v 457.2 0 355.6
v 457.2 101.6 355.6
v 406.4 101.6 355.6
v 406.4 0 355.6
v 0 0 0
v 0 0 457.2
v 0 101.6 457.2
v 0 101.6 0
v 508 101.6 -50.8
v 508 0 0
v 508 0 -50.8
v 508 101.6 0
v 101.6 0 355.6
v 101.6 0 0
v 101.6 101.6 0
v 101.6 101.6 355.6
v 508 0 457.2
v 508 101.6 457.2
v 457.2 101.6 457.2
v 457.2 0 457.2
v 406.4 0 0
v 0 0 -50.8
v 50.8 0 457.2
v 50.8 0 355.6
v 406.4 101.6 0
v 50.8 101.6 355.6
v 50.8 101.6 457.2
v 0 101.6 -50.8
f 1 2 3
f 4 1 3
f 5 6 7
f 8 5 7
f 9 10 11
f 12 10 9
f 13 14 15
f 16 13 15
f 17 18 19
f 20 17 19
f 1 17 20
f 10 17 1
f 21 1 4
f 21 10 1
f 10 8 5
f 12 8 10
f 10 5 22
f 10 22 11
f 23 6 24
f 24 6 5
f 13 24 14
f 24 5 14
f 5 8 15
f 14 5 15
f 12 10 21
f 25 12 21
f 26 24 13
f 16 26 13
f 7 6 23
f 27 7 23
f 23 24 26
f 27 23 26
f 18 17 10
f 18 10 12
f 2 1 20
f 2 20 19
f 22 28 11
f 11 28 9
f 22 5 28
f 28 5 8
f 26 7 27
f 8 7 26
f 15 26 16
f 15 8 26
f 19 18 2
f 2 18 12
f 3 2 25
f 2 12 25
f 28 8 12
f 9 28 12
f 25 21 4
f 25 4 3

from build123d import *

# Parameters (mm, degrees)
F0_W     = 50.8
F0_H     = 101.6
F1_DEPTH = 457.2
F2_W     = 50.8
F2_H     = 101.6
F3_DEPTH = 355.6
F6_W     = 508
F6_H     = 101.6
F7_DEPTH = 50.8


with BuildPart() as f1:
    # F0 (on Top) → F1 (new body)
    with BuildSketch(Plane.XY):
        with Locations((25.4, 50.8)):
            Rectangle(F0_W, F0_H)
    extrude(amount=F1_DEPTH)

    # F2 (on Top) → F3 (join)
    with BuildSketch(Plane.XY):
        with Locations((76.2, 50.8)):
            Rectangle(F2_W, F2_H)
    extrude(amount=F3_DEPTH)


with BuildPart() as f5_1:
    # F5: instance of F1
    add(f1.part.mirror(Plane(origin=(254, 50.8, 177.8), x_dir=(0, 1, 0), z_dir=(1, 0, 0))))


with BuildPart() as f7:
    # F6 (on Top) → F7 (new body)
    with BuildSketch(Plane.XY):
        with Locations((254, 50.8)):
            Rectangle(F6_W, F6_H)
    extrude(amount=-F7_DEPTH)


solid = Compound([f1.part, f5_1.part, f7.part])
